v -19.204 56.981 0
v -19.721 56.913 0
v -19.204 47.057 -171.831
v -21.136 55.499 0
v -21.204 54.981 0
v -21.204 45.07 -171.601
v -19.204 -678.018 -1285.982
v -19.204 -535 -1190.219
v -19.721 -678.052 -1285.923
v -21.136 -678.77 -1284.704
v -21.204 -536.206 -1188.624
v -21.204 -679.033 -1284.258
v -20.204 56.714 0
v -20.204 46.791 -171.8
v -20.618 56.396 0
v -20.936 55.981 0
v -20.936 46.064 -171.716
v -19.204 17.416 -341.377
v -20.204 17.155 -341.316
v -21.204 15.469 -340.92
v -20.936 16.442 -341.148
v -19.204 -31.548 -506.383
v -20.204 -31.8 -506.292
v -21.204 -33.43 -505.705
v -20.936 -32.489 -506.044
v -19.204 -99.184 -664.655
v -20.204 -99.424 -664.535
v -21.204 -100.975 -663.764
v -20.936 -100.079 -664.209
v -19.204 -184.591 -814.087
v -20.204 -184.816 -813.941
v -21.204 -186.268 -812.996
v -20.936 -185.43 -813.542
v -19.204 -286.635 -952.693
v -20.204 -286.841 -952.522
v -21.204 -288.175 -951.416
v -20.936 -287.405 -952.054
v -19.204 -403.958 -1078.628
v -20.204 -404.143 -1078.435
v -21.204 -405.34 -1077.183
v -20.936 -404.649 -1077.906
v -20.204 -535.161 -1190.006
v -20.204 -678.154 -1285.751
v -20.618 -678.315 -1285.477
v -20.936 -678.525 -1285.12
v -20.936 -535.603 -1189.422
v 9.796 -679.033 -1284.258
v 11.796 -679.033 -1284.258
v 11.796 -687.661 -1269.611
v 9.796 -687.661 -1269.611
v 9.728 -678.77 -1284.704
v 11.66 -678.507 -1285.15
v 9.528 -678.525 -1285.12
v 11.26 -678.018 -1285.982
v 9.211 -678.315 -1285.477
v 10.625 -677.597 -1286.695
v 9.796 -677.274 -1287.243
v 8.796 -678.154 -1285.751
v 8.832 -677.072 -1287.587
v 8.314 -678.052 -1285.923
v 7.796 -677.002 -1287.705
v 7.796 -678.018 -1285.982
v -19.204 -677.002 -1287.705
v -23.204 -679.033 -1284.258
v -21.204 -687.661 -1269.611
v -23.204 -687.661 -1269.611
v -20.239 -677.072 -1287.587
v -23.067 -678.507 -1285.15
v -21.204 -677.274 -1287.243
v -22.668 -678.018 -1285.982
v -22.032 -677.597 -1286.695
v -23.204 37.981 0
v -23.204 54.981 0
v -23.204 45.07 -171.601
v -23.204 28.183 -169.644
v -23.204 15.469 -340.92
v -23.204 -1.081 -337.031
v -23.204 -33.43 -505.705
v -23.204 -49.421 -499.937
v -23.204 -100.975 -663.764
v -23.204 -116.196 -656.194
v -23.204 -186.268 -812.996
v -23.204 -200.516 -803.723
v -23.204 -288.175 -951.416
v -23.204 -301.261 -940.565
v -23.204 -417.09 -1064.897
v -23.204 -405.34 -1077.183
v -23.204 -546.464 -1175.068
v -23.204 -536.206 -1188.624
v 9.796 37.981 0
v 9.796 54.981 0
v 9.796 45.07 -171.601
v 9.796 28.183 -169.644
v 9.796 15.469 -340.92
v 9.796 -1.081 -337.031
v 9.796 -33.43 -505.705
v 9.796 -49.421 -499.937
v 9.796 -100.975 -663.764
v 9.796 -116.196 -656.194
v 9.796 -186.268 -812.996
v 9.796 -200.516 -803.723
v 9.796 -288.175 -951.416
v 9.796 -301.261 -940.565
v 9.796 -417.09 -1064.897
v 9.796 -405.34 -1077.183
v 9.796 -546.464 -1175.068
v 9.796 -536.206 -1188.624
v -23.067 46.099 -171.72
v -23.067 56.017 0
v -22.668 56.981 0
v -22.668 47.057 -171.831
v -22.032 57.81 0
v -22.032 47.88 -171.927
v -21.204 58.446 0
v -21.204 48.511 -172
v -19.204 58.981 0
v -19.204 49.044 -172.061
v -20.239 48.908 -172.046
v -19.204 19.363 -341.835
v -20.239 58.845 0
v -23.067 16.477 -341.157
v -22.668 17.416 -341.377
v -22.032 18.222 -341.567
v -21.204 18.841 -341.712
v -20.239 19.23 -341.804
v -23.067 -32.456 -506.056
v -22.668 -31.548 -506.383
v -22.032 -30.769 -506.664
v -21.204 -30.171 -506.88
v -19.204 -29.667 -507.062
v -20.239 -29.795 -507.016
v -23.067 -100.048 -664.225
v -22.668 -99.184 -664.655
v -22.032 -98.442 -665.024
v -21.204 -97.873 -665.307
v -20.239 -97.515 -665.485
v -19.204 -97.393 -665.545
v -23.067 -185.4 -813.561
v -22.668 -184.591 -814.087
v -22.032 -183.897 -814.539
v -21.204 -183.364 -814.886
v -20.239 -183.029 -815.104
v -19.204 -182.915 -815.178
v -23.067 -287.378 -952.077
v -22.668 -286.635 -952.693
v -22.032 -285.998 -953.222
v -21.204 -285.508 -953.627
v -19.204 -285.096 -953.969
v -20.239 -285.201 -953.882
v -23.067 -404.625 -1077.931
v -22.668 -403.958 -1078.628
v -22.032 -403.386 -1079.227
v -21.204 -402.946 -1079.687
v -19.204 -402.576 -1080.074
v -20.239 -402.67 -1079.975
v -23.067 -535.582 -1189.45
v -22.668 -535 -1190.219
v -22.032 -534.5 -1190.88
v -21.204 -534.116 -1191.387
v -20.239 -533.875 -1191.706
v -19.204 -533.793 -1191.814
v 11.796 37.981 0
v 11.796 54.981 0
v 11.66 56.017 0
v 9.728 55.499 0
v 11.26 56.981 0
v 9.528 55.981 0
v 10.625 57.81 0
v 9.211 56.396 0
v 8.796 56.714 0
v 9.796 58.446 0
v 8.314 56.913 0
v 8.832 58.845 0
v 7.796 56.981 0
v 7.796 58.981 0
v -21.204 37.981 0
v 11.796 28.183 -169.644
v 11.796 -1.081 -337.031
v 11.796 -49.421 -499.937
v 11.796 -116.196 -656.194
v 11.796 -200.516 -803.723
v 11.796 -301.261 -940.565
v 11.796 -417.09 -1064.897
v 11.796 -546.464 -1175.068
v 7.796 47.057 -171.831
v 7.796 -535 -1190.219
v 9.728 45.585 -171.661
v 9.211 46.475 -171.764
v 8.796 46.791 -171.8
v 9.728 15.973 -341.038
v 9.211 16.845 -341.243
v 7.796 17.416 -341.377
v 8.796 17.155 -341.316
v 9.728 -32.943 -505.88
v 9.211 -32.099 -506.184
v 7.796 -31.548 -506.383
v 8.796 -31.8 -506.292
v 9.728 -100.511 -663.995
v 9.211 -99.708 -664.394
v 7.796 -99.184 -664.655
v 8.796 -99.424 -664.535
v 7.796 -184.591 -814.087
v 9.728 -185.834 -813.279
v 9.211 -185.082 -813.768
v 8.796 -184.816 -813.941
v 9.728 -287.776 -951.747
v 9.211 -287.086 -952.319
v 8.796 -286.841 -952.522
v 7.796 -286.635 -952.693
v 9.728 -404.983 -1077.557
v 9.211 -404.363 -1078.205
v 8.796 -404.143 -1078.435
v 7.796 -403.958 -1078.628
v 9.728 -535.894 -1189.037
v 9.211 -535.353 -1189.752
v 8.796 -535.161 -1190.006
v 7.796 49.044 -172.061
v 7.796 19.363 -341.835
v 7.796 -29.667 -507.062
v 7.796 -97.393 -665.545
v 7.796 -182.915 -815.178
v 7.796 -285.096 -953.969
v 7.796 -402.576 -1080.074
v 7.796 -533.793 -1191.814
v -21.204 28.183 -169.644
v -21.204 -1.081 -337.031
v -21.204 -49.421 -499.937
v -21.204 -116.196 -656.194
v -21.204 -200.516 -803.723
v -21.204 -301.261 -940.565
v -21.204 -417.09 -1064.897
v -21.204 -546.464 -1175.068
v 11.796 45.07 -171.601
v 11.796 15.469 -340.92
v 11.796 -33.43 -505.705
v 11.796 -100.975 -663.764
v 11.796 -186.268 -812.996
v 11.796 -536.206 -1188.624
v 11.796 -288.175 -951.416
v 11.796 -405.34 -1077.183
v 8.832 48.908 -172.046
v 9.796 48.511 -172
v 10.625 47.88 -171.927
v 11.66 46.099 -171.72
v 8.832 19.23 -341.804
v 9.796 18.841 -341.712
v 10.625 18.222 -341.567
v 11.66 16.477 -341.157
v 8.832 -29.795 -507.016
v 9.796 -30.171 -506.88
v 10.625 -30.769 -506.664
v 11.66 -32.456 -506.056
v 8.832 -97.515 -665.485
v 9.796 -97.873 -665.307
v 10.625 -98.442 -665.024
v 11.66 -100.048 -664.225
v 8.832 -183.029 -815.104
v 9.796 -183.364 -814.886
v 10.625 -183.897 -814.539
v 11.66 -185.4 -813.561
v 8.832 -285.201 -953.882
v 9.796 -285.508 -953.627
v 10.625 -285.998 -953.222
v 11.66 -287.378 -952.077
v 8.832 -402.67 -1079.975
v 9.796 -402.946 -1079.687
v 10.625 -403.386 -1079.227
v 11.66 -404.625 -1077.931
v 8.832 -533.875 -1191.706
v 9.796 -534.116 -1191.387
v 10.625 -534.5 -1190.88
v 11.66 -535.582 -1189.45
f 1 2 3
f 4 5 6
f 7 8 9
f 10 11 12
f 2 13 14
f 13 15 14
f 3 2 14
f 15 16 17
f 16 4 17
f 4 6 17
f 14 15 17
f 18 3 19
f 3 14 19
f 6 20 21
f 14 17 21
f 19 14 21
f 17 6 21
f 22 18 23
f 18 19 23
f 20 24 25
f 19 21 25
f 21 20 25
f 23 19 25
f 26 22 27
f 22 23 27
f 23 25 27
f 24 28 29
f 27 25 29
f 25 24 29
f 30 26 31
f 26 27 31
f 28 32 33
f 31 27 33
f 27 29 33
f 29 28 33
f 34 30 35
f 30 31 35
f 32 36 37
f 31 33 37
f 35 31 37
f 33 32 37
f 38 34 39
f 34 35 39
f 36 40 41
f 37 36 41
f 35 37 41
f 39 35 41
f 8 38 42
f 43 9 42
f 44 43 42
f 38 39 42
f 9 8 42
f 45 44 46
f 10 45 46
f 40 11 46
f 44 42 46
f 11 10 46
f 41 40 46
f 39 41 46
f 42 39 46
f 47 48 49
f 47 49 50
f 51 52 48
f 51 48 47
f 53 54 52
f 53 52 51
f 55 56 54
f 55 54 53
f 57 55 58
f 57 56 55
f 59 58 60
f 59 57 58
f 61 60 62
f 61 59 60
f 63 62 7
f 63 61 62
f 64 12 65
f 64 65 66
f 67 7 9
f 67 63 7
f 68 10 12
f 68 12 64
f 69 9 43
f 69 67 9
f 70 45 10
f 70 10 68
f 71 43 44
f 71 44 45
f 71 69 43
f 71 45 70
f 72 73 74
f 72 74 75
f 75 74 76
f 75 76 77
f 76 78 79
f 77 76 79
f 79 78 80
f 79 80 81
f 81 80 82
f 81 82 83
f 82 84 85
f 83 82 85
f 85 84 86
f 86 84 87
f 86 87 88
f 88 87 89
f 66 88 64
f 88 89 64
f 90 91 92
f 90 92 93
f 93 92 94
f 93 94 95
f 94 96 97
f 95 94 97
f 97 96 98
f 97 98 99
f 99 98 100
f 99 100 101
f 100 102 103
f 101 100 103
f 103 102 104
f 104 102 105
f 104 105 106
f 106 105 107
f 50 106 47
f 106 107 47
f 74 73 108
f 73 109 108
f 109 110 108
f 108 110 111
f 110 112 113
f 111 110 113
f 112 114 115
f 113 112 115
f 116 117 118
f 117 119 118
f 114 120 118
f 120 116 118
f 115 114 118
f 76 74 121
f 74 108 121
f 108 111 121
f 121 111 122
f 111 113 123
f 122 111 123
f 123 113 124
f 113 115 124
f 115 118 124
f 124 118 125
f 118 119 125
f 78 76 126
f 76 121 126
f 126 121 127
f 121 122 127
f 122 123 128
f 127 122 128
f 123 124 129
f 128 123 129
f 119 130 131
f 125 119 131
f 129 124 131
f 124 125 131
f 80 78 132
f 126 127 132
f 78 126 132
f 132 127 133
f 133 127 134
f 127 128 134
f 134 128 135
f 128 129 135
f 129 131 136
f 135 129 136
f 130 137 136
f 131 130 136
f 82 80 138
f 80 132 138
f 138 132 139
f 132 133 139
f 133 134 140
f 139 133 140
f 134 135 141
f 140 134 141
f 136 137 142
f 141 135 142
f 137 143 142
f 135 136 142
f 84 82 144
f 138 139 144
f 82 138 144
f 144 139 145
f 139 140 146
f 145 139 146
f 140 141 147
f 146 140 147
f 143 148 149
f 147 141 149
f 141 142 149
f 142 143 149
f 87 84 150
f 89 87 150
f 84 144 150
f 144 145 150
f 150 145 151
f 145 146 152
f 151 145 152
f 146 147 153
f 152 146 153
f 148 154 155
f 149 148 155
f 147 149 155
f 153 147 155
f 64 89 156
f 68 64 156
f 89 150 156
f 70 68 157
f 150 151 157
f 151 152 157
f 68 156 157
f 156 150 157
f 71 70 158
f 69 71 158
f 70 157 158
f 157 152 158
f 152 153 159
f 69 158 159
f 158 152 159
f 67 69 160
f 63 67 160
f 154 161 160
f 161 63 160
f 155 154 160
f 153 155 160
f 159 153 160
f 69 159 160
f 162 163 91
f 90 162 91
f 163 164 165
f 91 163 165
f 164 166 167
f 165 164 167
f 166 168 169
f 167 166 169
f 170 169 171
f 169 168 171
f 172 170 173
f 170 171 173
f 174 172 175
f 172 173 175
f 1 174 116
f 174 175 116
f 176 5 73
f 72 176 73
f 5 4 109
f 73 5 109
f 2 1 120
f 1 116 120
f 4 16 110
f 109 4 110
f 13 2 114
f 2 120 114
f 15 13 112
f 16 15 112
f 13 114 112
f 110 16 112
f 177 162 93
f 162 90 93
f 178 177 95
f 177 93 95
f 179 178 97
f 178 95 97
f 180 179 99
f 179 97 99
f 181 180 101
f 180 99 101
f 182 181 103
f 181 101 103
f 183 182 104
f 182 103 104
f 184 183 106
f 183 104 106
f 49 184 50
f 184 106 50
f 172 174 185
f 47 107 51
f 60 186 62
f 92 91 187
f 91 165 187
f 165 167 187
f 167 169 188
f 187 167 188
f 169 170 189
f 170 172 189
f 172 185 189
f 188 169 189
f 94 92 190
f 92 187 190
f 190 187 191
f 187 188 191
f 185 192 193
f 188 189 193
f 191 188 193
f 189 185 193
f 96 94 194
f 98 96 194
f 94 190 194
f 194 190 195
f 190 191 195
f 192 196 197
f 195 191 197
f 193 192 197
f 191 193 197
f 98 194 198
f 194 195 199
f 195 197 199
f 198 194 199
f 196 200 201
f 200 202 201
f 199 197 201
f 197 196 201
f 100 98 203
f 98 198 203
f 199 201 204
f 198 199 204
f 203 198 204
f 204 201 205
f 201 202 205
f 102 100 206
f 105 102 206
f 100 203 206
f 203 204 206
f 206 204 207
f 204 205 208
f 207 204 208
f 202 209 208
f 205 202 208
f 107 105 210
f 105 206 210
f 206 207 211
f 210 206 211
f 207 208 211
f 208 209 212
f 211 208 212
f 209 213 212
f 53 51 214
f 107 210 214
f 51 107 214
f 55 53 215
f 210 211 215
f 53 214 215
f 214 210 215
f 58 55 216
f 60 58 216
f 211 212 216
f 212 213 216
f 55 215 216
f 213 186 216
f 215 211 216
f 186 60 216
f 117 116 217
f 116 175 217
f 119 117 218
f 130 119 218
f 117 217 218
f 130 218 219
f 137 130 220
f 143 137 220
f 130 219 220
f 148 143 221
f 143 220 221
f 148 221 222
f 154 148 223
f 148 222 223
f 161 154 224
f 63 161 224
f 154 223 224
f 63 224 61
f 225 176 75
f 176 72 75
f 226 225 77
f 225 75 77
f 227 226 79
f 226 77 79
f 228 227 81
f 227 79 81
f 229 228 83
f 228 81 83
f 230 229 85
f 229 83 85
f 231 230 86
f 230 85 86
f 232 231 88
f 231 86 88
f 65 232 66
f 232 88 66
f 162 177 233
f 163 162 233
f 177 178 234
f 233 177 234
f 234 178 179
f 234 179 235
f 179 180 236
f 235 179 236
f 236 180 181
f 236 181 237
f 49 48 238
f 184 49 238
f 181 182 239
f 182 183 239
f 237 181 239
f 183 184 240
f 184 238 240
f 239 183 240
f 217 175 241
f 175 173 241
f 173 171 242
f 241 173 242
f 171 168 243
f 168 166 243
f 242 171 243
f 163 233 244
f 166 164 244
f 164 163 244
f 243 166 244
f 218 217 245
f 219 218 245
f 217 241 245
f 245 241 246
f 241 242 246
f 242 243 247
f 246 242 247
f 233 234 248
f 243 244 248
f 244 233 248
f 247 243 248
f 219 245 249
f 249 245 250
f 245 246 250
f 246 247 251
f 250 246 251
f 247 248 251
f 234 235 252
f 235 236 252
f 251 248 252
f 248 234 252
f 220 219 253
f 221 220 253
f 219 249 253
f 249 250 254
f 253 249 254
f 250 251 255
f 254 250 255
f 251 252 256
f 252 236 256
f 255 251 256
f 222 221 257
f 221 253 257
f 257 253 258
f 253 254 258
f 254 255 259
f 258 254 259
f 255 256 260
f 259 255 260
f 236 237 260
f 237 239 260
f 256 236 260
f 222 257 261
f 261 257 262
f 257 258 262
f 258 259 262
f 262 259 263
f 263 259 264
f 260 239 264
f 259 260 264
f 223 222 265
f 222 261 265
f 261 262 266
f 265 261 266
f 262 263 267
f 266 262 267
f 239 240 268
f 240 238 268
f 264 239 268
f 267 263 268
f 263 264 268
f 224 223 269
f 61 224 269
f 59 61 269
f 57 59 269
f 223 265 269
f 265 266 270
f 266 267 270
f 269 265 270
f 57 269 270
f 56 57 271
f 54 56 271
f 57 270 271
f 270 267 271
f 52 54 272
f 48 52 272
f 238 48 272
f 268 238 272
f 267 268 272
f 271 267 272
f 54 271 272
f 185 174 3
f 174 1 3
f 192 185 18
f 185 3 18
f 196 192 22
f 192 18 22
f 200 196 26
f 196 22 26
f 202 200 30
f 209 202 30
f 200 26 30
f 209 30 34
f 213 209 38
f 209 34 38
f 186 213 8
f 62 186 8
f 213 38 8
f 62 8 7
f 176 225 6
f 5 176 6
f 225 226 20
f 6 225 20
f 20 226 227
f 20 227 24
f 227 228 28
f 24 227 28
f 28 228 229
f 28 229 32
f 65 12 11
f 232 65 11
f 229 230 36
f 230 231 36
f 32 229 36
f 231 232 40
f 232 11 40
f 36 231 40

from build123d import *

# Parameters (mm, degrees)
REVOLVE1_ANGLE = 59.5


with BuildPart() as part:
    # Sketch1 → Revolve1 (revolve)
    with BuildSketch(Plane.XY):
        with BuildLine():
            Line((-23.203703704, 37.981481481), (-23.203703704, 54.981481481))
            ThreePointArc((-23.203703704, 54.981481481), (-22.032130828, 57.809908606), (-19.203703704, 58.981481481))
            Line((-19.203703704, 58.981481481), (7.796296296, 58.981481481))
            ThreePointArc((7.796296296, 58.981481481), (10.624723421, 57.809908606), (11.796296296, 54.981481481))
            Line((11.796296296, 54.981481481), (11.796296296, 37.981481481))
            Line((11.796296296, 37.981481481), (9.796296296, 37.981481481))
            Line((9.796296296, 37.981481481), (9.796296296, 54.981481481))
            ThreePointArc((9.796296296, 54.981481481), (9.210509859, 56.395695044), (7.796296296, 56.981481481))
            Line((7.796296296, 56.981481481), (-19.203703704, 56.981481481))
            ThreePointArc((-19.203703704, 56.981481481), (-20.617917266, 56.395695044), (-21.203703704, 54.981481481))
            Line((-21.203703704, 54.981481481), (-21.203703704, 37.981481481))
            Line((-21.203703704, 37.981481481), (-23.203703704, 37.981481481))
        make_face()
    revolve(axis=Axis((14.479414078, -1435.518518519, 0), (-1, 0, 0)), revolution_arc=REVOLVE1_ANGLE)


solid = part.part
